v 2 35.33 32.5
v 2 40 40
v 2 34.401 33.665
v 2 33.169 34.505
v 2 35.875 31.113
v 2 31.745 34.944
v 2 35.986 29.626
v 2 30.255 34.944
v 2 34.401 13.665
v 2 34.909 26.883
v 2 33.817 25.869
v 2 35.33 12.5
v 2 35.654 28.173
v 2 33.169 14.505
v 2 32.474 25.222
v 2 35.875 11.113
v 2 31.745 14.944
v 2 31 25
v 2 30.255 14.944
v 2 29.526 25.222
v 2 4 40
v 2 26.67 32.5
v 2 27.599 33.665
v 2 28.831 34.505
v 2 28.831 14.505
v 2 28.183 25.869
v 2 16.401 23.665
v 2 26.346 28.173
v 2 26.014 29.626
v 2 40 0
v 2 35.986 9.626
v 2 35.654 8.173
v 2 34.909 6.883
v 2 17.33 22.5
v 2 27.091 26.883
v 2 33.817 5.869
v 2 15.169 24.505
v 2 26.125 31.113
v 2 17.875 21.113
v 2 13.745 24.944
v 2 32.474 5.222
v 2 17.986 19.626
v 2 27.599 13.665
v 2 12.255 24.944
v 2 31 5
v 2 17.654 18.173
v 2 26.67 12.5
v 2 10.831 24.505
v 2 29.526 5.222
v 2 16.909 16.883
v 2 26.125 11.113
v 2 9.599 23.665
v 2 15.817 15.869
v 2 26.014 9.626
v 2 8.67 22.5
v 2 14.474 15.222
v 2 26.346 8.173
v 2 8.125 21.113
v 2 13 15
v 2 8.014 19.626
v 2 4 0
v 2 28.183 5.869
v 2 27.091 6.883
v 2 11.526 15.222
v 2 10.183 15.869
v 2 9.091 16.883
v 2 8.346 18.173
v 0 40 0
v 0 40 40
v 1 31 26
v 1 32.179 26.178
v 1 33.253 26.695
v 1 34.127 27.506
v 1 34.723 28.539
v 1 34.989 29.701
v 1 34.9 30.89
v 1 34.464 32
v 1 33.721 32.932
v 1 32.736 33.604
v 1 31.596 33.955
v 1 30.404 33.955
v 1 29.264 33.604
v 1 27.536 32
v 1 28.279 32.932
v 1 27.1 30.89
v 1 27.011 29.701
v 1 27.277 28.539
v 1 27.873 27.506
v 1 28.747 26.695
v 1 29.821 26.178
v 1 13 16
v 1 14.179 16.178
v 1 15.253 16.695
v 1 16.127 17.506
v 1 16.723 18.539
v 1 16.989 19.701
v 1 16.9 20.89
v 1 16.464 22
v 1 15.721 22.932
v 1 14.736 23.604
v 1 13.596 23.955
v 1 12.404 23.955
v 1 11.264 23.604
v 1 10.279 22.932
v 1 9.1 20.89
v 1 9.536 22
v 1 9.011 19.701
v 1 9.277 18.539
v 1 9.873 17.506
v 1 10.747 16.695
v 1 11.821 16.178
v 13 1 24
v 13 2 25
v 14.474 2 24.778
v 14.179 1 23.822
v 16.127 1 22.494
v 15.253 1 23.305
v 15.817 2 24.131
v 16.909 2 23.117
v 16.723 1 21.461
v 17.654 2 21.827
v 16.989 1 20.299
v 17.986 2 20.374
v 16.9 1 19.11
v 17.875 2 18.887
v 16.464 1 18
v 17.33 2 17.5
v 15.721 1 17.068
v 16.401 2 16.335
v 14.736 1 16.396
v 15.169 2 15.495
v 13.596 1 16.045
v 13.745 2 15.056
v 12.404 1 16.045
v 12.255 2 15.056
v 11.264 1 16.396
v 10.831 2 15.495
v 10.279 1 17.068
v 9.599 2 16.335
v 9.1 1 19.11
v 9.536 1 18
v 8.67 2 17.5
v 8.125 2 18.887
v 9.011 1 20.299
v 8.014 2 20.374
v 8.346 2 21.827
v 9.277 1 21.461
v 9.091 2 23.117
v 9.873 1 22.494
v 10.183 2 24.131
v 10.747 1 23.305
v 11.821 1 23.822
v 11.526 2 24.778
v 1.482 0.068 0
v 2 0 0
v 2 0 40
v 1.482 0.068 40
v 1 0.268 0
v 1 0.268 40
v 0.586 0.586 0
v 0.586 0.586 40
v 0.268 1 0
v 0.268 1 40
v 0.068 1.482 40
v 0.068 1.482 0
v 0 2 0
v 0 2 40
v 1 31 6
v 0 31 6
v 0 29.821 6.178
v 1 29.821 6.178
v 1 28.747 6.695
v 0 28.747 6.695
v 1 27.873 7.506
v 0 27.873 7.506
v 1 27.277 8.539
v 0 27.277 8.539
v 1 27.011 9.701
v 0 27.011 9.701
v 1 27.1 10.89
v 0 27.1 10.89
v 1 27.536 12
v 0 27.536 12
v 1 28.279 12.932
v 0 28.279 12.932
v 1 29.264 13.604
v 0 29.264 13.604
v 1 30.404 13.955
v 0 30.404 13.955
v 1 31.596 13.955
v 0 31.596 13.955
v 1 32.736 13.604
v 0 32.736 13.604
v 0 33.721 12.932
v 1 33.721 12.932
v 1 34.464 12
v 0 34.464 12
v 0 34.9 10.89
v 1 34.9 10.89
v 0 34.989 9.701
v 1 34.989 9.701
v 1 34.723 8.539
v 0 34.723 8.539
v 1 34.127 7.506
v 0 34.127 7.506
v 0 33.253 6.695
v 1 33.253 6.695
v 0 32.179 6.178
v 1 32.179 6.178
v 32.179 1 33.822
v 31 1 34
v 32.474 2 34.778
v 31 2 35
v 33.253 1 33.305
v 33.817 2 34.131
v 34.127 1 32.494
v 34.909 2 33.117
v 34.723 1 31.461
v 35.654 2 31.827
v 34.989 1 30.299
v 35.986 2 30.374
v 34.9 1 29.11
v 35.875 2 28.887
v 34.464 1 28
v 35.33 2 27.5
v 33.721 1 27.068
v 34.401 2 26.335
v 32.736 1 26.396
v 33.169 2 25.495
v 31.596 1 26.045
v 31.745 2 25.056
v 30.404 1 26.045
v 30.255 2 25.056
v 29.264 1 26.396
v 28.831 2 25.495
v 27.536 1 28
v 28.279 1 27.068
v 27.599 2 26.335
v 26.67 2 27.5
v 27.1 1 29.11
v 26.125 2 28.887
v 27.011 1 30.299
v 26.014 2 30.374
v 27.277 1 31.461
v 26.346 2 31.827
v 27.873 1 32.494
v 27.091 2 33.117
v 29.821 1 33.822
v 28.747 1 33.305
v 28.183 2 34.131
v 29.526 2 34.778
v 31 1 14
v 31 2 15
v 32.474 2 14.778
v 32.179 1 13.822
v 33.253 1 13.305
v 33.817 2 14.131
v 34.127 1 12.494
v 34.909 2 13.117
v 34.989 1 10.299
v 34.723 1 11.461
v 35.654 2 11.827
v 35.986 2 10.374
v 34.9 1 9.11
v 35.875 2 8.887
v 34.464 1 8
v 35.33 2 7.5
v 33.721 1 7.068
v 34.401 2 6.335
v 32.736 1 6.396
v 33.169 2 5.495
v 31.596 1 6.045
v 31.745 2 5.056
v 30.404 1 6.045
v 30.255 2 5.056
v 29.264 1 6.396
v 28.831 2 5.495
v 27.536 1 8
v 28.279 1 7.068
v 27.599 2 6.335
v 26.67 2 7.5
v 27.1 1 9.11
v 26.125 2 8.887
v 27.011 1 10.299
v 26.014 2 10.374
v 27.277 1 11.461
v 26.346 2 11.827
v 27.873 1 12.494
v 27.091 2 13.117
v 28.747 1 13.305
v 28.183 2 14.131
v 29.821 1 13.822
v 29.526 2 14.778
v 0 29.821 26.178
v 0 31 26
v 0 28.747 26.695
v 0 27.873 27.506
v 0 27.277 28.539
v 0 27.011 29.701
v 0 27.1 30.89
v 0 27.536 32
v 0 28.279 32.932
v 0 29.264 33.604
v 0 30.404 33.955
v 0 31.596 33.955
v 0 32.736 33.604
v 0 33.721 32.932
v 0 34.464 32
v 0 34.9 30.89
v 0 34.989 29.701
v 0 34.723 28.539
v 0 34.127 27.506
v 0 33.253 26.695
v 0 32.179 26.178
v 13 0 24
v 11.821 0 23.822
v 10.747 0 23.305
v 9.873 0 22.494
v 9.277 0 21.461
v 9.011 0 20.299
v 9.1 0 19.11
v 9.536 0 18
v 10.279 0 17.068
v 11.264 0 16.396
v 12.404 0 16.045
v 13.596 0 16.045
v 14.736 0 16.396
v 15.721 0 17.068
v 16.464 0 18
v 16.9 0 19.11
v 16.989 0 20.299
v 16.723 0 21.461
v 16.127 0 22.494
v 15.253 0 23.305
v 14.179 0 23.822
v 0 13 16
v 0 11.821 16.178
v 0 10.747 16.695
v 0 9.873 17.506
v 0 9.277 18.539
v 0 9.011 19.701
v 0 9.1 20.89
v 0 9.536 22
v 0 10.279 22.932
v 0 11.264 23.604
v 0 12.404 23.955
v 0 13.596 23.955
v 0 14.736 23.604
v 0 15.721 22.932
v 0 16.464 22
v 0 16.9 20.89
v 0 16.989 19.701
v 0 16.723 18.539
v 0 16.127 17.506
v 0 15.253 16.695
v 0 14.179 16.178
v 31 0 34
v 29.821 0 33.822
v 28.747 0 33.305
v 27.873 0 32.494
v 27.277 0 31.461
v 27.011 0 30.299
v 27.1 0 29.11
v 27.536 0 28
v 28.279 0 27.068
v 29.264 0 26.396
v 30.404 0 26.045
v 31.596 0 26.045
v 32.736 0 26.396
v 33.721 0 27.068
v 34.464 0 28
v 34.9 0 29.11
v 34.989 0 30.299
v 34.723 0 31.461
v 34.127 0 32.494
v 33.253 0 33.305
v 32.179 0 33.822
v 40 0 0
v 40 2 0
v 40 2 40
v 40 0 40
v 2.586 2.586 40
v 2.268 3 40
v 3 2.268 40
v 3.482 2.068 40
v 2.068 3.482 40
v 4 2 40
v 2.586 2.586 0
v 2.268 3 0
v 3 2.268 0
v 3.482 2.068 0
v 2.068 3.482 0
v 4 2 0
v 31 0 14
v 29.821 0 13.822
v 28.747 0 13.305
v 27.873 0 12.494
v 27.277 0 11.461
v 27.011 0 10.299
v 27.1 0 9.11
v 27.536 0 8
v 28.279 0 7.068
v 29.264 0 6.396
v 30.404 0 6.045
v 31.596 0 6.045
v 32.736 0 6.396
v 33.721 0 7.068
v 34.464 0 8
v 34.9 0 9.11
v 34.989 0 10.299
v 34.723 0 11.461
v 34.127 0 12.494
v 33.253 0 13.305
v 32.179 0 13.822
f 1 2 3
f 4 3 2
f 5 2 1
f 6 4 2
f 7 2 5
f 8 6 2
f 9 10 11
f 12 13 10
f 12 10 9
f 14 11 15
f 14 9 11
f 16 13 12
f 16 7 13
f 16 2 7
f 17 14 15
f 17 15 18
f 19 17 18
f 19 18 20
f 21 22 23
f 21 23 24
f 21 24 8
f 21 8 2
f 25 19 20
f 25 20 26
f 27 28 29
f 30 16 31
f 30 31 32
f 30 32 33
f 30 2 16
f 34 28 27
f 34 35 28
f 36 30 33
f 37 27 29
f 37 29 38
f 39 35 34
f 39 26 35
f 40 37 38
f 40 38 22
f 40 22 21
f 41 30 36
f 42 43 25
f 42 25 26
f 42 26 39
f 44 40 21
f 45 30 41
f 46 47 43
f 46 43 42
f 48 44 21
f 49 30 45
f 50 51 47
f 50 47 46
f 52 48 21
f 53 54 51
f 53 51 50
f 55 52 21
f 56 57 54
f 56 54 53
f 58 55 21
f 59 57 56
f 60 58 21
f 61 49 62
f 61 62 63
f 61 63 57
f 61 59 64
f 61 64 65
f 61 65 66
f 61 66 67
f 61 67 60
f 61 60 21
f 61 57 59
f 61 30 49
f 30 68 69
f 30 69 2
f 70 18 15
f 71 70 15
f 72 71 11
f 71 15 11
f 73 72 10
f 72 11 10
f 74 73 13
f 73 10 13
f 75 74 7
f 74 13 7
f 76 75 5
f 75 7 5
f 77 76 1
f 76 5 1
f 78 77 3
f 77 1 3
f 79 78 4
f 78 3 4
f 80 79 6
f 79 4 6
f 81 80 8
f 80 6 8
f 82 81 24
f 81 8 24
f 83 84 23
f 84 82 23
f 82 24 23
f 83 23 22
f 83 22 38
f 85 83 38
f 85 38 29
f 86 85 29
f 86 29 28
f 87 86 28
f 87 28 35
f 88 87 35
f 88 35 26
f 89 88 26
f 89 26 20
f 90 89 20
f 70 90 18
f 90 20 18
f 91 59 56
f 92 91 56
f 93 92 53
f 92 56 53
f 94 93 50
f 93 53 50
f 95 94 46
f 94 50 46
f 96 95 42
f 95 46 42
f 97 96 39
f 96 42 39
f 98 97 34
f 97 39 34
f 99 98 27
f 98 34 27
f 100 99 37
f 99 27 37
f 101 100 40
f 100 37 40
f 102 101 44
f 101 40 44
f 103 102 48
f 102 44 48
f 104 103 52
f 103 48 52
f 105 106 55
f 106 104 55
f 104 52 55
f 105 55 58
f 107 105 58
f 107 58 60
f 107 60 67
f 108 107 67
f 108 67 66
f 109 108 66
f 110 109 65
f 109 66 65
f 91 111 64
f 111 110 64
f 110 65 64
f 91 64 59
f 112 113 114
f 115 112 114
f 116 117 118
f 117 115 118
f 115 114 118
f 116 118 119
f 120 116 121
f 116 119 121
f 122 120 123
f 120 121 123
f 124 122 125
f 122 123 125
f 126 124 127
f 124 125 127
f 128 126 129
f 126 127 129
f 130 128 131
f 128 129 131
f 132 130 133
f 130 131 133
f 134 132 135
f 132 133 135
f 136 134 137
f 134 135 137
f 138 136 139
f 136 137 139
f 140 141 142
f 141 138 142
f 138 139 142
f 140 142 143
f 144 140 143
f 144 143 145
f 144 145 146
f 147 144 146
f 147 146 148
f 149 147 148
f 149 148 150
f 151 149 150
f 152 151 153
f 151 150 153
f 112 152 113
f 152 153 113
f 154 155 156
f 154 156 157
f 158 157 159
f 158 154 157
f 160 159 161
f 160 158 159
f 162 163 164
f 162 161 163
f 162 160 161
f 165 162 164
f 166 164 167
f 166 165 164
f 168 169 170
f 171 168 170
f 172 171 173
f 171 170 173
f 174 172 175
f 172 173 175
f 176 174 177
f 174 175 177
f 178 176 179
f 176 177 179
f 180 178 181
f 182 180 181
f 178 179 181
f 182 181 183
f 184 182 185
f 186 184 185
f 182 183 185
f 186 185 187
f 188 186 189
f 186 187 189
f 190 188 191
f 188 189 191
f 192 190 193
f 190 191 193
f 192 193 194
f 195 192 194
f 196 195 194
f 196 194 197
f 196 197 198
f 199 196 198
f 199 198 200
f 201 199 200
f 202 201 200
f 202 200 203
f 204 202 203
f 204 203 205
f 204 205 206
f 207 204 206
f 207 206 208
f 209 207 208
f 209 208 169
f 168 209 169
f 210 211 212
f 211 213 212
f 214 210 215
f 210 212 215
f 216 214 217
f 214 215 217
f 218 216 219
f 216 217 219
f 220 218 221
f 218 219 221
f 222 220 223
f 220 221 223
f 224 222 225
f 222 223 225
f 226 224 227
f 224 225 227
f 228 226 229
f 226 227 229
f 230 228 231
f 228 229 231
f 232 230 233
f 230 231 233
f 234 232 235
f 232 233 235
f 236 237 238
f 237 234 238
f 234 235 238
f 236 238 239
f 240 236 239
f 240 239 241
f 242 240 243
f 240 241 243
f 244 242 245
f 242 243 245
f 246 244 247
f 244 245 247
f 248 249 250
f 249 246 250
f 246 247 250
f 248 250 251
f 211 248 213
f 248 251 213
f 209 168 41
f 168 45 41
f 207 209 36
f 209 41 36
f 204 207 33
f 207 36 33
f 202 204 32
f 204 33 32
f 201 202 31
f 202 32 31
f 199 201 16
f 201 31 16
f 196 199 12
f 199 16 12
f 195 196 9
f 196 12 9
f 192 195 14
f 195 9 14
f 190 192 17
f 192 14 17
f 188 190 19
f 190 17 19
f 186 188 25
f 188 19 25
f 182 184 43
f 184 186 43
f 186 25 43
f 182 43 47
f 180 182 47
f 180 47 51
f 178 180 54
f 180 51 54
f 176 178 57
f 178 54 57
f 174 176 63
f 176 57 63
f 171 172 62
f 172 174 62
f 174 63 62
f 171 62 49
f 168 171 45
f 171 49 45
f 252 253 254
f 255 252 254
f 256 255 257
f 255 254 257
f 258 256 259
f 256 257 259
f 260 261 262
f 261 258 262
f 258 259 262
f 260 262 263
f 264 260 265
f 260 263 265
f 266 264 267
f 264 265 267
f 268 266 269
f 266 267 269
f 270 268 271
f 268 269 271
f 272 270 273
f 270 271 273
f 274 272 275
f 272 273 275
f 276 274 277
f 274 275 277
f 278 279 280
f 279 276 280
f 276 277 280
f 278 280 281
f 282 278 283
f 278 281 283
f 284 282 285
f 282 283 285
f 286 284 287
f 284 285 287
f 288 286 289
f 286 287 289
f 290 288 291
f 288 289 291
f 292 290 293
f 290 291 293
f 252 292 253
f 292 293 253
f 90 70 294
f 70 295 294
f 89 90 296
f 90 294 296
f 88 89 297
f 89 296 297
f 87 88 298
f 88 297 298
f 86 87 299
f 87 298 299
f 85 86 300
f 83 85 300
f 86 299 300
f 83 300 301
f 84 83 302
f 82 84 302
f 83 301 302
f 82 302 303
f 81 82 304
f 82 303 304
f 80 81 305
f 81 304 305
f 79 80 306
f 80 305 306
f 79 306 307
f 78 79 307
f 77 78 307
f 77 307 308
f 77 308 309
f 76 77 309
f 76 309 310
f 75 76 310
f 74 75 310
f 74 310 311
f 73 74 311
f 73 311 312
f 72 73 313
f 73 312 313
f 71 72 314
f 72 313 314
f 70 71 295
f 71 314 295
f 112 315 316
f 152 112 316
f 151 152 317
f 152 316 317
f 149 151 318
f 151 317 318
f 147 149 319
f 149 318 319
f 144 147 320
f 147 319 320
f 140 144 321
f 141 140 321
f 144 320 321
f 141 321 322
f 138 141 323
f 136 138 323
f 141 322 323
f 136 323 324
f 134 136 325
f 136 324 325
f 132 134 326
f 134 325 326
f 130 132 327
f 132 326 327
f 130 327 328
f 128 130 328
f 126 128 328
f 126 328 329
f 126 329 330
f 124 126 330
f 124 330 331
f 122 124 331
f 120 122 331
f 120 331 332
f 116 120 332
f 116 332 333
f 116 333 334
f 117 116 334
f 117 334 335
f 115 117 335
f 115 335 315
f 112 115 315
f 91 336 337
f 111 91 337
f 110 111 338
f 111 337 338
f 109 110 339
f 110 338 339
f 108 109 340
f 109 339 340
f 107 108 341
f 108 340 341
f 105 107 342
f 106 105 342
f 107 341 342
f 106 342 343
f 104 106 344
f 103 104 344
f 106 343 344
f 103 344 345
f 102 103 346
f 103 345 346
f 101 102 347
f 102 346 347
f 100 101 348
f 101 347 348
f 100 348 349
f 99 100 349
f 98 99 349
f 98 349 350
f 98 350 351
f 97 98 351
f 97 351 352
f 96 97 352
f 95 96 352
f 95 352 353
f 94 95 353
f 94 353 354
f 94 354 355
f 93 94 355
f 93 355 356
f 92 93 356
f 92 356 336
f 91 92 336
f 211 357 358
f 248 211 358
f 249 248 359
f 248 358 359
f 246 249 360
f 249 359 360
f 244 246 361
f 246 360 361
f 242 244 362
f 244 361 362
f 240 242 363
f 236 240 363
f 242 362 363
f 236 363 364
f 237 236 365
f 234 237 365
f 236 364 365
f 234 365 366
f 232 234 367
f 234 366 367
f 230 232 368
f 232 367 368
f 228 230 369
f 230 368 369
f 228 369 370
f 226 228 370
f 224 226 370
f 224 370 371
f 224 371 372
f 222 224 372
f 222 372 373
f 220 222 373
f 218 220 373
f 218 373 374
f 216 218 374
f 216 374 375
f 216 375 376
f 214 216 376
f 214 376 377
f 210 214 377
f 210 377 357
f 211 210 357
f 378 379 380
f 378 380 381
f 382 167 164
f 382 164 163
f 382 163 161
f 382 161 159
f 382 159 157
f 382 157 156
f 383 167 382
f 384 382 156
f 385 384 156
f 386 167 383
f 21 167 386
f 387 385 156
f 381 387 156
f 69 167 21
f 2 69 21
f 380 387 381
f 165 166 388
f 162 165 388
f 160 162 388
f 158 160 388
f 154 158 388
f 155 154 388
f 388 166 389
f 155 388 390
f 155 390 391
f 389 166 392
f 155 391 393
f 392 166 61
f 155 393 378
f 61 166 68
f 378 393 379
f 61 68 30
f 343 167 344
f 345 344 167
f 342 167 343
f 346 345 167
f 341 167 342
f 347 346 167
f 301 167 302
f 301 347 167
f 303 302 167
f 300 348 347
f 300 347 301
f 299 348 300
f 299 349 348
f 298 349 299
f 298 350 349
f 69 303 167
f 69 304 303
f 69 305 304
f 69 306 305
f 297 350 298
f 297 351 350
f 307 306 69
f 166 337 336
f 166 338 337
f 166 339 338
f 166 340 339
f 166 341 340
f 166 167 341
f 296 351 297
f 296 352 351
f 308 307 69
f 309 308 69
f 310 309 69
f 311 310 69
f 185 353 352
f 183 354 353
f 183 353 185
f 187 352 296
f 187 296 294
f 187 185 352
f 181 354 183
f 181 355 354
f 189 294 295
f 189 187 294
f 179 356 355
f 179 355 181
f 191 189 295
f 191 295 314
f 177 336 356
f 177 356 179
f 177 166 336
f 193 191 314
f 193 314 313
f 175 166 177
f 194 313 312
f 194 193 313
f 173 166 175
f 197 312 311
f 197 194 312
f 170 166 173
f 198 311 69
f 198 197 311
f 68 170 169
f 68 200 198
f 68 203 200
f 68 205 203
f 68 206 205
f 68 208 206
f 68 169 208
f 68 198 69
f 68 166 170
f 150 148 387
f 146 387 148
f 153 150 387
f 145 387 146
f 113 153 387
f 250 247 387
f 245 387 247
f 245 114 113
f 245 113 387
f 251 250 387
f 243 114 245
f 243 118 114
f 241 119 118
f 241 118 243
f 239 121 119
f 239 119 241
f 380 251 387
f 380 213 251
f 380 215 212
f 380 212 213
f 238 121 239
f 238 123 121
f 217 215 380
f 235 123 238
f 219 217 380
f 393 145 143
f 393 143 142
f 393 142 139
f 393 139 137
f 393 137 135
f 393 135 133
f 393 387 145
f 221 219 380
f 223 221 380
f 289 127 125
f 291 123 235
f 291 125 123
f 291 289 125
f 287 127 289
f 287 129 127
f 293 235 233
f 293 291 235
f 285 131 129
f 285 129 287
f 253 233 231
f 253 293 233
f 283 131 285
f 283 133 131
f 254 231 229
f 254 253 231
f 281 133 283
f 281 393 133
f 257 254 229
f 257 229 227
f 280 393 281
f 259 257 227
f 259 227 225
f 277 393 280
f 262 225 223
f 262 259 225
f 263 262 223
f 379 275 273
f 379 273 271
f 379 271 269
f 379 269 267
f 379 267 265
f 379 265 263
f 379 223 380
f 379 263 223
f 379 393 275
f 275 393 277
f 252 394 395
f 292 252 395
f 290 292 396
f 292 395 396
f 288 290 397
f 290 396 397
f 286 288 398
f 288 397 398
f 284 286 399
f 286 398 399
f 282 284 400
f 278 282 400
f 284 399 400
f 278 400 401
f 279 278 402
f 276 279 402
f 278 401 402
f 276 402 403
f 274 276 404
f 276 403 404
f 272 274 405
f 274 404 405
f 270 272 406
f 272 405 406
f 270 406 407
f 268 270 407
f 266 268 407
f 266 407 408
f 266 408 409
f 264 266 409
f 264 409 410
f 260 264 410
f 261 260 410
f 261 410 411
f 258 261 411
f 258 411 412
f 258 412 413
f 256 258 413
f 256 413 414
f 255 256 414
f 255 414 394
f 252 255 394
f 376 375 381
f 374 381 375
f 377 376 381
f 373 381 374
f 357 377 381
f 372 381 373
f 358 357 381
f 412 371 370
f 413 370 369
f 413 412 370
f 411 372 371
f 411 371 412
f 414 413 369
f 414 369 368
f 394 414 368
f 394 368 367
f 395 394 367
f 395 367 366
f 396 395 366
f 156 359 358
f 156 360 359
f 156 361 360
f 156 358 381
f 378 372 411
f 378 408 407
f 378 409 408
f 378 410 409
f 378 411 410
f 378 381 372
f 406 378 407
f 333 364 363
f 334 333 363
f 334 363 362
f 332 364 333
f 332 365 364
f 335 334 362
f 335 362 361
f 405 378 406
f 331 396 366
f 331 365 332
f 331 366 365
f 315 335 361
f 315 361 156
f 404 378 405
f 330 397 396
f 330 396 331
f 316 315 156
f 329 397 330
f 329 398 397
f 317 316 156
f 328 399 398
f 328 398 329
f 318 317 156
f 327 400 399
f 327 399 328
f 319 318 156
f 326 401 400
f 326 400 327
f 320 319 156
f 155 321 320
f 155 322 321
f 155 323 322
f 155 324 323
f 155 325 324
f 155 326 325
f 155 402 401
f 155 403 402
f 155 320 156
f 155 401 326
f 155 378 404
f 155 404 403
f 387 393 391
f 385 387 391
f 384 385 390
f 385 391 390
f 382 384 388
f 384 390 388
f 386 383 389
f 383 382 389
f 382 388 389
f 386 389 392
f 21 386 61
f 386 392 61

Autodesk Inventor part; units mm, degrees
ref_plane "YZ Plane" through (0, 0, 0) normal (1, 0, 0) x (0, 1, 0)
ref_plane "XZ Plane" through (0, 0, 0) normal (0, 1, 0) x (-1, 0, 0)
ref_plane "XY Plane" through (0, 0, 0) normal (0, 0, 1) x (1, 0, 0)
sketch "Szkic1" plane through (0, 0, 0) normal (0, 0, 1) x (1, 0, 0)
  line L0 (0, 2) -> (0, 40)
  line L1 (0, 40) -> (2, 40)
  line L2 (2, 40) -> (2, 4)
  line L3 (4, 2) -> (40, 2)
  line L4 (40, 2) -> (40, 0)
  line L5 (40, 0) -> (2, 0)
  arc A0 (0, 2) -> (2, 0) centre (2, 2) ccw
  arc A1 (2, 4) -> (4, 2) centre (4, 4) ccw
  point P0 (0, 0)
  point P1 (2, 2)
  dimension "d0" = 40
  dimension "d1" = 2
  dimension "d2" = 38
  dimension "d3" = 38
  dimension "d4" = 2
extrude "Wyciągnięcie proste1" add sketch "Szkic1" along normal blind 40
sketch "Szkic2" plane through (2, 4, 0) normal (1, 0, 0) x (0, 0, -1)
  line L0 (0, 0) -> (-40, 0) projected
  line L1 (-20, 0) -> (-20, 36)
  line L2 (0, 36) -> (-40, 36) projected
  line L3 (-20, 18) -> (-40, 18)
  line L4 (-40, 0) -> (-40, 36) projected
  line L5 (-20, 18) -> (0, 18)
  line L6 (-40, 18) -> (-40, 27)
  line L7 (-40, 27) -> (-30, 27)
  line L8 (0, 0) -> (0, 36) projected
  line L9 (0, 27) -> (-10, 27)
  line L10 (-20, 18) -> (-20, 9)
  point P0 (0, -4)
  dimension "d13" = 9
  dimension "d14" = 30
  dimension "d16" = 9
  dimension "d17" = 20
  dimension "d18" = 9
sketch "Szkic3" plane through (4, 2, 0) normal (0, 1, 0) x (1, 0, 0)
  line L0 (0, 0) -> (0, -40) projected
  line L1 (0, -40) -> (0, -20)
  line L2 (0, -20) -> (9, -20)
  line L3 (36, -40) -> (0, -40) projected
  line L4 (18, -40) -> (18, 0)
  line L5 (36, 0) -> (0, 0) projected
  line L6 (18, -20) -> (36, -20)
  line L7 (36, 0) -> (36, -40) projected
  line L8 (27, -20) -> (27, -30)
  line L9 (27, -20) -> (27, -10)
  point P0 (-4, 0)
  dimension "d19" = 9
  dimension "d20" = 10
  dimension "d21" = 10
hole "Otwór1" at (2, 31, 30) at (2, 31, 10) at (2, 13, 20) direction (-1, 0, 0) diameter 8 end through all countersink diameter 10 countersink angle 90
hole "Otwór2" at (13, 2, 20) at (31, 2, 30) at (31, 2, 10) direction (0, -1, 0) diameter 8 end through all countersink diameter 10 countersink angle 90
properties part number "katownik_lacznikowy_40_40_40"
